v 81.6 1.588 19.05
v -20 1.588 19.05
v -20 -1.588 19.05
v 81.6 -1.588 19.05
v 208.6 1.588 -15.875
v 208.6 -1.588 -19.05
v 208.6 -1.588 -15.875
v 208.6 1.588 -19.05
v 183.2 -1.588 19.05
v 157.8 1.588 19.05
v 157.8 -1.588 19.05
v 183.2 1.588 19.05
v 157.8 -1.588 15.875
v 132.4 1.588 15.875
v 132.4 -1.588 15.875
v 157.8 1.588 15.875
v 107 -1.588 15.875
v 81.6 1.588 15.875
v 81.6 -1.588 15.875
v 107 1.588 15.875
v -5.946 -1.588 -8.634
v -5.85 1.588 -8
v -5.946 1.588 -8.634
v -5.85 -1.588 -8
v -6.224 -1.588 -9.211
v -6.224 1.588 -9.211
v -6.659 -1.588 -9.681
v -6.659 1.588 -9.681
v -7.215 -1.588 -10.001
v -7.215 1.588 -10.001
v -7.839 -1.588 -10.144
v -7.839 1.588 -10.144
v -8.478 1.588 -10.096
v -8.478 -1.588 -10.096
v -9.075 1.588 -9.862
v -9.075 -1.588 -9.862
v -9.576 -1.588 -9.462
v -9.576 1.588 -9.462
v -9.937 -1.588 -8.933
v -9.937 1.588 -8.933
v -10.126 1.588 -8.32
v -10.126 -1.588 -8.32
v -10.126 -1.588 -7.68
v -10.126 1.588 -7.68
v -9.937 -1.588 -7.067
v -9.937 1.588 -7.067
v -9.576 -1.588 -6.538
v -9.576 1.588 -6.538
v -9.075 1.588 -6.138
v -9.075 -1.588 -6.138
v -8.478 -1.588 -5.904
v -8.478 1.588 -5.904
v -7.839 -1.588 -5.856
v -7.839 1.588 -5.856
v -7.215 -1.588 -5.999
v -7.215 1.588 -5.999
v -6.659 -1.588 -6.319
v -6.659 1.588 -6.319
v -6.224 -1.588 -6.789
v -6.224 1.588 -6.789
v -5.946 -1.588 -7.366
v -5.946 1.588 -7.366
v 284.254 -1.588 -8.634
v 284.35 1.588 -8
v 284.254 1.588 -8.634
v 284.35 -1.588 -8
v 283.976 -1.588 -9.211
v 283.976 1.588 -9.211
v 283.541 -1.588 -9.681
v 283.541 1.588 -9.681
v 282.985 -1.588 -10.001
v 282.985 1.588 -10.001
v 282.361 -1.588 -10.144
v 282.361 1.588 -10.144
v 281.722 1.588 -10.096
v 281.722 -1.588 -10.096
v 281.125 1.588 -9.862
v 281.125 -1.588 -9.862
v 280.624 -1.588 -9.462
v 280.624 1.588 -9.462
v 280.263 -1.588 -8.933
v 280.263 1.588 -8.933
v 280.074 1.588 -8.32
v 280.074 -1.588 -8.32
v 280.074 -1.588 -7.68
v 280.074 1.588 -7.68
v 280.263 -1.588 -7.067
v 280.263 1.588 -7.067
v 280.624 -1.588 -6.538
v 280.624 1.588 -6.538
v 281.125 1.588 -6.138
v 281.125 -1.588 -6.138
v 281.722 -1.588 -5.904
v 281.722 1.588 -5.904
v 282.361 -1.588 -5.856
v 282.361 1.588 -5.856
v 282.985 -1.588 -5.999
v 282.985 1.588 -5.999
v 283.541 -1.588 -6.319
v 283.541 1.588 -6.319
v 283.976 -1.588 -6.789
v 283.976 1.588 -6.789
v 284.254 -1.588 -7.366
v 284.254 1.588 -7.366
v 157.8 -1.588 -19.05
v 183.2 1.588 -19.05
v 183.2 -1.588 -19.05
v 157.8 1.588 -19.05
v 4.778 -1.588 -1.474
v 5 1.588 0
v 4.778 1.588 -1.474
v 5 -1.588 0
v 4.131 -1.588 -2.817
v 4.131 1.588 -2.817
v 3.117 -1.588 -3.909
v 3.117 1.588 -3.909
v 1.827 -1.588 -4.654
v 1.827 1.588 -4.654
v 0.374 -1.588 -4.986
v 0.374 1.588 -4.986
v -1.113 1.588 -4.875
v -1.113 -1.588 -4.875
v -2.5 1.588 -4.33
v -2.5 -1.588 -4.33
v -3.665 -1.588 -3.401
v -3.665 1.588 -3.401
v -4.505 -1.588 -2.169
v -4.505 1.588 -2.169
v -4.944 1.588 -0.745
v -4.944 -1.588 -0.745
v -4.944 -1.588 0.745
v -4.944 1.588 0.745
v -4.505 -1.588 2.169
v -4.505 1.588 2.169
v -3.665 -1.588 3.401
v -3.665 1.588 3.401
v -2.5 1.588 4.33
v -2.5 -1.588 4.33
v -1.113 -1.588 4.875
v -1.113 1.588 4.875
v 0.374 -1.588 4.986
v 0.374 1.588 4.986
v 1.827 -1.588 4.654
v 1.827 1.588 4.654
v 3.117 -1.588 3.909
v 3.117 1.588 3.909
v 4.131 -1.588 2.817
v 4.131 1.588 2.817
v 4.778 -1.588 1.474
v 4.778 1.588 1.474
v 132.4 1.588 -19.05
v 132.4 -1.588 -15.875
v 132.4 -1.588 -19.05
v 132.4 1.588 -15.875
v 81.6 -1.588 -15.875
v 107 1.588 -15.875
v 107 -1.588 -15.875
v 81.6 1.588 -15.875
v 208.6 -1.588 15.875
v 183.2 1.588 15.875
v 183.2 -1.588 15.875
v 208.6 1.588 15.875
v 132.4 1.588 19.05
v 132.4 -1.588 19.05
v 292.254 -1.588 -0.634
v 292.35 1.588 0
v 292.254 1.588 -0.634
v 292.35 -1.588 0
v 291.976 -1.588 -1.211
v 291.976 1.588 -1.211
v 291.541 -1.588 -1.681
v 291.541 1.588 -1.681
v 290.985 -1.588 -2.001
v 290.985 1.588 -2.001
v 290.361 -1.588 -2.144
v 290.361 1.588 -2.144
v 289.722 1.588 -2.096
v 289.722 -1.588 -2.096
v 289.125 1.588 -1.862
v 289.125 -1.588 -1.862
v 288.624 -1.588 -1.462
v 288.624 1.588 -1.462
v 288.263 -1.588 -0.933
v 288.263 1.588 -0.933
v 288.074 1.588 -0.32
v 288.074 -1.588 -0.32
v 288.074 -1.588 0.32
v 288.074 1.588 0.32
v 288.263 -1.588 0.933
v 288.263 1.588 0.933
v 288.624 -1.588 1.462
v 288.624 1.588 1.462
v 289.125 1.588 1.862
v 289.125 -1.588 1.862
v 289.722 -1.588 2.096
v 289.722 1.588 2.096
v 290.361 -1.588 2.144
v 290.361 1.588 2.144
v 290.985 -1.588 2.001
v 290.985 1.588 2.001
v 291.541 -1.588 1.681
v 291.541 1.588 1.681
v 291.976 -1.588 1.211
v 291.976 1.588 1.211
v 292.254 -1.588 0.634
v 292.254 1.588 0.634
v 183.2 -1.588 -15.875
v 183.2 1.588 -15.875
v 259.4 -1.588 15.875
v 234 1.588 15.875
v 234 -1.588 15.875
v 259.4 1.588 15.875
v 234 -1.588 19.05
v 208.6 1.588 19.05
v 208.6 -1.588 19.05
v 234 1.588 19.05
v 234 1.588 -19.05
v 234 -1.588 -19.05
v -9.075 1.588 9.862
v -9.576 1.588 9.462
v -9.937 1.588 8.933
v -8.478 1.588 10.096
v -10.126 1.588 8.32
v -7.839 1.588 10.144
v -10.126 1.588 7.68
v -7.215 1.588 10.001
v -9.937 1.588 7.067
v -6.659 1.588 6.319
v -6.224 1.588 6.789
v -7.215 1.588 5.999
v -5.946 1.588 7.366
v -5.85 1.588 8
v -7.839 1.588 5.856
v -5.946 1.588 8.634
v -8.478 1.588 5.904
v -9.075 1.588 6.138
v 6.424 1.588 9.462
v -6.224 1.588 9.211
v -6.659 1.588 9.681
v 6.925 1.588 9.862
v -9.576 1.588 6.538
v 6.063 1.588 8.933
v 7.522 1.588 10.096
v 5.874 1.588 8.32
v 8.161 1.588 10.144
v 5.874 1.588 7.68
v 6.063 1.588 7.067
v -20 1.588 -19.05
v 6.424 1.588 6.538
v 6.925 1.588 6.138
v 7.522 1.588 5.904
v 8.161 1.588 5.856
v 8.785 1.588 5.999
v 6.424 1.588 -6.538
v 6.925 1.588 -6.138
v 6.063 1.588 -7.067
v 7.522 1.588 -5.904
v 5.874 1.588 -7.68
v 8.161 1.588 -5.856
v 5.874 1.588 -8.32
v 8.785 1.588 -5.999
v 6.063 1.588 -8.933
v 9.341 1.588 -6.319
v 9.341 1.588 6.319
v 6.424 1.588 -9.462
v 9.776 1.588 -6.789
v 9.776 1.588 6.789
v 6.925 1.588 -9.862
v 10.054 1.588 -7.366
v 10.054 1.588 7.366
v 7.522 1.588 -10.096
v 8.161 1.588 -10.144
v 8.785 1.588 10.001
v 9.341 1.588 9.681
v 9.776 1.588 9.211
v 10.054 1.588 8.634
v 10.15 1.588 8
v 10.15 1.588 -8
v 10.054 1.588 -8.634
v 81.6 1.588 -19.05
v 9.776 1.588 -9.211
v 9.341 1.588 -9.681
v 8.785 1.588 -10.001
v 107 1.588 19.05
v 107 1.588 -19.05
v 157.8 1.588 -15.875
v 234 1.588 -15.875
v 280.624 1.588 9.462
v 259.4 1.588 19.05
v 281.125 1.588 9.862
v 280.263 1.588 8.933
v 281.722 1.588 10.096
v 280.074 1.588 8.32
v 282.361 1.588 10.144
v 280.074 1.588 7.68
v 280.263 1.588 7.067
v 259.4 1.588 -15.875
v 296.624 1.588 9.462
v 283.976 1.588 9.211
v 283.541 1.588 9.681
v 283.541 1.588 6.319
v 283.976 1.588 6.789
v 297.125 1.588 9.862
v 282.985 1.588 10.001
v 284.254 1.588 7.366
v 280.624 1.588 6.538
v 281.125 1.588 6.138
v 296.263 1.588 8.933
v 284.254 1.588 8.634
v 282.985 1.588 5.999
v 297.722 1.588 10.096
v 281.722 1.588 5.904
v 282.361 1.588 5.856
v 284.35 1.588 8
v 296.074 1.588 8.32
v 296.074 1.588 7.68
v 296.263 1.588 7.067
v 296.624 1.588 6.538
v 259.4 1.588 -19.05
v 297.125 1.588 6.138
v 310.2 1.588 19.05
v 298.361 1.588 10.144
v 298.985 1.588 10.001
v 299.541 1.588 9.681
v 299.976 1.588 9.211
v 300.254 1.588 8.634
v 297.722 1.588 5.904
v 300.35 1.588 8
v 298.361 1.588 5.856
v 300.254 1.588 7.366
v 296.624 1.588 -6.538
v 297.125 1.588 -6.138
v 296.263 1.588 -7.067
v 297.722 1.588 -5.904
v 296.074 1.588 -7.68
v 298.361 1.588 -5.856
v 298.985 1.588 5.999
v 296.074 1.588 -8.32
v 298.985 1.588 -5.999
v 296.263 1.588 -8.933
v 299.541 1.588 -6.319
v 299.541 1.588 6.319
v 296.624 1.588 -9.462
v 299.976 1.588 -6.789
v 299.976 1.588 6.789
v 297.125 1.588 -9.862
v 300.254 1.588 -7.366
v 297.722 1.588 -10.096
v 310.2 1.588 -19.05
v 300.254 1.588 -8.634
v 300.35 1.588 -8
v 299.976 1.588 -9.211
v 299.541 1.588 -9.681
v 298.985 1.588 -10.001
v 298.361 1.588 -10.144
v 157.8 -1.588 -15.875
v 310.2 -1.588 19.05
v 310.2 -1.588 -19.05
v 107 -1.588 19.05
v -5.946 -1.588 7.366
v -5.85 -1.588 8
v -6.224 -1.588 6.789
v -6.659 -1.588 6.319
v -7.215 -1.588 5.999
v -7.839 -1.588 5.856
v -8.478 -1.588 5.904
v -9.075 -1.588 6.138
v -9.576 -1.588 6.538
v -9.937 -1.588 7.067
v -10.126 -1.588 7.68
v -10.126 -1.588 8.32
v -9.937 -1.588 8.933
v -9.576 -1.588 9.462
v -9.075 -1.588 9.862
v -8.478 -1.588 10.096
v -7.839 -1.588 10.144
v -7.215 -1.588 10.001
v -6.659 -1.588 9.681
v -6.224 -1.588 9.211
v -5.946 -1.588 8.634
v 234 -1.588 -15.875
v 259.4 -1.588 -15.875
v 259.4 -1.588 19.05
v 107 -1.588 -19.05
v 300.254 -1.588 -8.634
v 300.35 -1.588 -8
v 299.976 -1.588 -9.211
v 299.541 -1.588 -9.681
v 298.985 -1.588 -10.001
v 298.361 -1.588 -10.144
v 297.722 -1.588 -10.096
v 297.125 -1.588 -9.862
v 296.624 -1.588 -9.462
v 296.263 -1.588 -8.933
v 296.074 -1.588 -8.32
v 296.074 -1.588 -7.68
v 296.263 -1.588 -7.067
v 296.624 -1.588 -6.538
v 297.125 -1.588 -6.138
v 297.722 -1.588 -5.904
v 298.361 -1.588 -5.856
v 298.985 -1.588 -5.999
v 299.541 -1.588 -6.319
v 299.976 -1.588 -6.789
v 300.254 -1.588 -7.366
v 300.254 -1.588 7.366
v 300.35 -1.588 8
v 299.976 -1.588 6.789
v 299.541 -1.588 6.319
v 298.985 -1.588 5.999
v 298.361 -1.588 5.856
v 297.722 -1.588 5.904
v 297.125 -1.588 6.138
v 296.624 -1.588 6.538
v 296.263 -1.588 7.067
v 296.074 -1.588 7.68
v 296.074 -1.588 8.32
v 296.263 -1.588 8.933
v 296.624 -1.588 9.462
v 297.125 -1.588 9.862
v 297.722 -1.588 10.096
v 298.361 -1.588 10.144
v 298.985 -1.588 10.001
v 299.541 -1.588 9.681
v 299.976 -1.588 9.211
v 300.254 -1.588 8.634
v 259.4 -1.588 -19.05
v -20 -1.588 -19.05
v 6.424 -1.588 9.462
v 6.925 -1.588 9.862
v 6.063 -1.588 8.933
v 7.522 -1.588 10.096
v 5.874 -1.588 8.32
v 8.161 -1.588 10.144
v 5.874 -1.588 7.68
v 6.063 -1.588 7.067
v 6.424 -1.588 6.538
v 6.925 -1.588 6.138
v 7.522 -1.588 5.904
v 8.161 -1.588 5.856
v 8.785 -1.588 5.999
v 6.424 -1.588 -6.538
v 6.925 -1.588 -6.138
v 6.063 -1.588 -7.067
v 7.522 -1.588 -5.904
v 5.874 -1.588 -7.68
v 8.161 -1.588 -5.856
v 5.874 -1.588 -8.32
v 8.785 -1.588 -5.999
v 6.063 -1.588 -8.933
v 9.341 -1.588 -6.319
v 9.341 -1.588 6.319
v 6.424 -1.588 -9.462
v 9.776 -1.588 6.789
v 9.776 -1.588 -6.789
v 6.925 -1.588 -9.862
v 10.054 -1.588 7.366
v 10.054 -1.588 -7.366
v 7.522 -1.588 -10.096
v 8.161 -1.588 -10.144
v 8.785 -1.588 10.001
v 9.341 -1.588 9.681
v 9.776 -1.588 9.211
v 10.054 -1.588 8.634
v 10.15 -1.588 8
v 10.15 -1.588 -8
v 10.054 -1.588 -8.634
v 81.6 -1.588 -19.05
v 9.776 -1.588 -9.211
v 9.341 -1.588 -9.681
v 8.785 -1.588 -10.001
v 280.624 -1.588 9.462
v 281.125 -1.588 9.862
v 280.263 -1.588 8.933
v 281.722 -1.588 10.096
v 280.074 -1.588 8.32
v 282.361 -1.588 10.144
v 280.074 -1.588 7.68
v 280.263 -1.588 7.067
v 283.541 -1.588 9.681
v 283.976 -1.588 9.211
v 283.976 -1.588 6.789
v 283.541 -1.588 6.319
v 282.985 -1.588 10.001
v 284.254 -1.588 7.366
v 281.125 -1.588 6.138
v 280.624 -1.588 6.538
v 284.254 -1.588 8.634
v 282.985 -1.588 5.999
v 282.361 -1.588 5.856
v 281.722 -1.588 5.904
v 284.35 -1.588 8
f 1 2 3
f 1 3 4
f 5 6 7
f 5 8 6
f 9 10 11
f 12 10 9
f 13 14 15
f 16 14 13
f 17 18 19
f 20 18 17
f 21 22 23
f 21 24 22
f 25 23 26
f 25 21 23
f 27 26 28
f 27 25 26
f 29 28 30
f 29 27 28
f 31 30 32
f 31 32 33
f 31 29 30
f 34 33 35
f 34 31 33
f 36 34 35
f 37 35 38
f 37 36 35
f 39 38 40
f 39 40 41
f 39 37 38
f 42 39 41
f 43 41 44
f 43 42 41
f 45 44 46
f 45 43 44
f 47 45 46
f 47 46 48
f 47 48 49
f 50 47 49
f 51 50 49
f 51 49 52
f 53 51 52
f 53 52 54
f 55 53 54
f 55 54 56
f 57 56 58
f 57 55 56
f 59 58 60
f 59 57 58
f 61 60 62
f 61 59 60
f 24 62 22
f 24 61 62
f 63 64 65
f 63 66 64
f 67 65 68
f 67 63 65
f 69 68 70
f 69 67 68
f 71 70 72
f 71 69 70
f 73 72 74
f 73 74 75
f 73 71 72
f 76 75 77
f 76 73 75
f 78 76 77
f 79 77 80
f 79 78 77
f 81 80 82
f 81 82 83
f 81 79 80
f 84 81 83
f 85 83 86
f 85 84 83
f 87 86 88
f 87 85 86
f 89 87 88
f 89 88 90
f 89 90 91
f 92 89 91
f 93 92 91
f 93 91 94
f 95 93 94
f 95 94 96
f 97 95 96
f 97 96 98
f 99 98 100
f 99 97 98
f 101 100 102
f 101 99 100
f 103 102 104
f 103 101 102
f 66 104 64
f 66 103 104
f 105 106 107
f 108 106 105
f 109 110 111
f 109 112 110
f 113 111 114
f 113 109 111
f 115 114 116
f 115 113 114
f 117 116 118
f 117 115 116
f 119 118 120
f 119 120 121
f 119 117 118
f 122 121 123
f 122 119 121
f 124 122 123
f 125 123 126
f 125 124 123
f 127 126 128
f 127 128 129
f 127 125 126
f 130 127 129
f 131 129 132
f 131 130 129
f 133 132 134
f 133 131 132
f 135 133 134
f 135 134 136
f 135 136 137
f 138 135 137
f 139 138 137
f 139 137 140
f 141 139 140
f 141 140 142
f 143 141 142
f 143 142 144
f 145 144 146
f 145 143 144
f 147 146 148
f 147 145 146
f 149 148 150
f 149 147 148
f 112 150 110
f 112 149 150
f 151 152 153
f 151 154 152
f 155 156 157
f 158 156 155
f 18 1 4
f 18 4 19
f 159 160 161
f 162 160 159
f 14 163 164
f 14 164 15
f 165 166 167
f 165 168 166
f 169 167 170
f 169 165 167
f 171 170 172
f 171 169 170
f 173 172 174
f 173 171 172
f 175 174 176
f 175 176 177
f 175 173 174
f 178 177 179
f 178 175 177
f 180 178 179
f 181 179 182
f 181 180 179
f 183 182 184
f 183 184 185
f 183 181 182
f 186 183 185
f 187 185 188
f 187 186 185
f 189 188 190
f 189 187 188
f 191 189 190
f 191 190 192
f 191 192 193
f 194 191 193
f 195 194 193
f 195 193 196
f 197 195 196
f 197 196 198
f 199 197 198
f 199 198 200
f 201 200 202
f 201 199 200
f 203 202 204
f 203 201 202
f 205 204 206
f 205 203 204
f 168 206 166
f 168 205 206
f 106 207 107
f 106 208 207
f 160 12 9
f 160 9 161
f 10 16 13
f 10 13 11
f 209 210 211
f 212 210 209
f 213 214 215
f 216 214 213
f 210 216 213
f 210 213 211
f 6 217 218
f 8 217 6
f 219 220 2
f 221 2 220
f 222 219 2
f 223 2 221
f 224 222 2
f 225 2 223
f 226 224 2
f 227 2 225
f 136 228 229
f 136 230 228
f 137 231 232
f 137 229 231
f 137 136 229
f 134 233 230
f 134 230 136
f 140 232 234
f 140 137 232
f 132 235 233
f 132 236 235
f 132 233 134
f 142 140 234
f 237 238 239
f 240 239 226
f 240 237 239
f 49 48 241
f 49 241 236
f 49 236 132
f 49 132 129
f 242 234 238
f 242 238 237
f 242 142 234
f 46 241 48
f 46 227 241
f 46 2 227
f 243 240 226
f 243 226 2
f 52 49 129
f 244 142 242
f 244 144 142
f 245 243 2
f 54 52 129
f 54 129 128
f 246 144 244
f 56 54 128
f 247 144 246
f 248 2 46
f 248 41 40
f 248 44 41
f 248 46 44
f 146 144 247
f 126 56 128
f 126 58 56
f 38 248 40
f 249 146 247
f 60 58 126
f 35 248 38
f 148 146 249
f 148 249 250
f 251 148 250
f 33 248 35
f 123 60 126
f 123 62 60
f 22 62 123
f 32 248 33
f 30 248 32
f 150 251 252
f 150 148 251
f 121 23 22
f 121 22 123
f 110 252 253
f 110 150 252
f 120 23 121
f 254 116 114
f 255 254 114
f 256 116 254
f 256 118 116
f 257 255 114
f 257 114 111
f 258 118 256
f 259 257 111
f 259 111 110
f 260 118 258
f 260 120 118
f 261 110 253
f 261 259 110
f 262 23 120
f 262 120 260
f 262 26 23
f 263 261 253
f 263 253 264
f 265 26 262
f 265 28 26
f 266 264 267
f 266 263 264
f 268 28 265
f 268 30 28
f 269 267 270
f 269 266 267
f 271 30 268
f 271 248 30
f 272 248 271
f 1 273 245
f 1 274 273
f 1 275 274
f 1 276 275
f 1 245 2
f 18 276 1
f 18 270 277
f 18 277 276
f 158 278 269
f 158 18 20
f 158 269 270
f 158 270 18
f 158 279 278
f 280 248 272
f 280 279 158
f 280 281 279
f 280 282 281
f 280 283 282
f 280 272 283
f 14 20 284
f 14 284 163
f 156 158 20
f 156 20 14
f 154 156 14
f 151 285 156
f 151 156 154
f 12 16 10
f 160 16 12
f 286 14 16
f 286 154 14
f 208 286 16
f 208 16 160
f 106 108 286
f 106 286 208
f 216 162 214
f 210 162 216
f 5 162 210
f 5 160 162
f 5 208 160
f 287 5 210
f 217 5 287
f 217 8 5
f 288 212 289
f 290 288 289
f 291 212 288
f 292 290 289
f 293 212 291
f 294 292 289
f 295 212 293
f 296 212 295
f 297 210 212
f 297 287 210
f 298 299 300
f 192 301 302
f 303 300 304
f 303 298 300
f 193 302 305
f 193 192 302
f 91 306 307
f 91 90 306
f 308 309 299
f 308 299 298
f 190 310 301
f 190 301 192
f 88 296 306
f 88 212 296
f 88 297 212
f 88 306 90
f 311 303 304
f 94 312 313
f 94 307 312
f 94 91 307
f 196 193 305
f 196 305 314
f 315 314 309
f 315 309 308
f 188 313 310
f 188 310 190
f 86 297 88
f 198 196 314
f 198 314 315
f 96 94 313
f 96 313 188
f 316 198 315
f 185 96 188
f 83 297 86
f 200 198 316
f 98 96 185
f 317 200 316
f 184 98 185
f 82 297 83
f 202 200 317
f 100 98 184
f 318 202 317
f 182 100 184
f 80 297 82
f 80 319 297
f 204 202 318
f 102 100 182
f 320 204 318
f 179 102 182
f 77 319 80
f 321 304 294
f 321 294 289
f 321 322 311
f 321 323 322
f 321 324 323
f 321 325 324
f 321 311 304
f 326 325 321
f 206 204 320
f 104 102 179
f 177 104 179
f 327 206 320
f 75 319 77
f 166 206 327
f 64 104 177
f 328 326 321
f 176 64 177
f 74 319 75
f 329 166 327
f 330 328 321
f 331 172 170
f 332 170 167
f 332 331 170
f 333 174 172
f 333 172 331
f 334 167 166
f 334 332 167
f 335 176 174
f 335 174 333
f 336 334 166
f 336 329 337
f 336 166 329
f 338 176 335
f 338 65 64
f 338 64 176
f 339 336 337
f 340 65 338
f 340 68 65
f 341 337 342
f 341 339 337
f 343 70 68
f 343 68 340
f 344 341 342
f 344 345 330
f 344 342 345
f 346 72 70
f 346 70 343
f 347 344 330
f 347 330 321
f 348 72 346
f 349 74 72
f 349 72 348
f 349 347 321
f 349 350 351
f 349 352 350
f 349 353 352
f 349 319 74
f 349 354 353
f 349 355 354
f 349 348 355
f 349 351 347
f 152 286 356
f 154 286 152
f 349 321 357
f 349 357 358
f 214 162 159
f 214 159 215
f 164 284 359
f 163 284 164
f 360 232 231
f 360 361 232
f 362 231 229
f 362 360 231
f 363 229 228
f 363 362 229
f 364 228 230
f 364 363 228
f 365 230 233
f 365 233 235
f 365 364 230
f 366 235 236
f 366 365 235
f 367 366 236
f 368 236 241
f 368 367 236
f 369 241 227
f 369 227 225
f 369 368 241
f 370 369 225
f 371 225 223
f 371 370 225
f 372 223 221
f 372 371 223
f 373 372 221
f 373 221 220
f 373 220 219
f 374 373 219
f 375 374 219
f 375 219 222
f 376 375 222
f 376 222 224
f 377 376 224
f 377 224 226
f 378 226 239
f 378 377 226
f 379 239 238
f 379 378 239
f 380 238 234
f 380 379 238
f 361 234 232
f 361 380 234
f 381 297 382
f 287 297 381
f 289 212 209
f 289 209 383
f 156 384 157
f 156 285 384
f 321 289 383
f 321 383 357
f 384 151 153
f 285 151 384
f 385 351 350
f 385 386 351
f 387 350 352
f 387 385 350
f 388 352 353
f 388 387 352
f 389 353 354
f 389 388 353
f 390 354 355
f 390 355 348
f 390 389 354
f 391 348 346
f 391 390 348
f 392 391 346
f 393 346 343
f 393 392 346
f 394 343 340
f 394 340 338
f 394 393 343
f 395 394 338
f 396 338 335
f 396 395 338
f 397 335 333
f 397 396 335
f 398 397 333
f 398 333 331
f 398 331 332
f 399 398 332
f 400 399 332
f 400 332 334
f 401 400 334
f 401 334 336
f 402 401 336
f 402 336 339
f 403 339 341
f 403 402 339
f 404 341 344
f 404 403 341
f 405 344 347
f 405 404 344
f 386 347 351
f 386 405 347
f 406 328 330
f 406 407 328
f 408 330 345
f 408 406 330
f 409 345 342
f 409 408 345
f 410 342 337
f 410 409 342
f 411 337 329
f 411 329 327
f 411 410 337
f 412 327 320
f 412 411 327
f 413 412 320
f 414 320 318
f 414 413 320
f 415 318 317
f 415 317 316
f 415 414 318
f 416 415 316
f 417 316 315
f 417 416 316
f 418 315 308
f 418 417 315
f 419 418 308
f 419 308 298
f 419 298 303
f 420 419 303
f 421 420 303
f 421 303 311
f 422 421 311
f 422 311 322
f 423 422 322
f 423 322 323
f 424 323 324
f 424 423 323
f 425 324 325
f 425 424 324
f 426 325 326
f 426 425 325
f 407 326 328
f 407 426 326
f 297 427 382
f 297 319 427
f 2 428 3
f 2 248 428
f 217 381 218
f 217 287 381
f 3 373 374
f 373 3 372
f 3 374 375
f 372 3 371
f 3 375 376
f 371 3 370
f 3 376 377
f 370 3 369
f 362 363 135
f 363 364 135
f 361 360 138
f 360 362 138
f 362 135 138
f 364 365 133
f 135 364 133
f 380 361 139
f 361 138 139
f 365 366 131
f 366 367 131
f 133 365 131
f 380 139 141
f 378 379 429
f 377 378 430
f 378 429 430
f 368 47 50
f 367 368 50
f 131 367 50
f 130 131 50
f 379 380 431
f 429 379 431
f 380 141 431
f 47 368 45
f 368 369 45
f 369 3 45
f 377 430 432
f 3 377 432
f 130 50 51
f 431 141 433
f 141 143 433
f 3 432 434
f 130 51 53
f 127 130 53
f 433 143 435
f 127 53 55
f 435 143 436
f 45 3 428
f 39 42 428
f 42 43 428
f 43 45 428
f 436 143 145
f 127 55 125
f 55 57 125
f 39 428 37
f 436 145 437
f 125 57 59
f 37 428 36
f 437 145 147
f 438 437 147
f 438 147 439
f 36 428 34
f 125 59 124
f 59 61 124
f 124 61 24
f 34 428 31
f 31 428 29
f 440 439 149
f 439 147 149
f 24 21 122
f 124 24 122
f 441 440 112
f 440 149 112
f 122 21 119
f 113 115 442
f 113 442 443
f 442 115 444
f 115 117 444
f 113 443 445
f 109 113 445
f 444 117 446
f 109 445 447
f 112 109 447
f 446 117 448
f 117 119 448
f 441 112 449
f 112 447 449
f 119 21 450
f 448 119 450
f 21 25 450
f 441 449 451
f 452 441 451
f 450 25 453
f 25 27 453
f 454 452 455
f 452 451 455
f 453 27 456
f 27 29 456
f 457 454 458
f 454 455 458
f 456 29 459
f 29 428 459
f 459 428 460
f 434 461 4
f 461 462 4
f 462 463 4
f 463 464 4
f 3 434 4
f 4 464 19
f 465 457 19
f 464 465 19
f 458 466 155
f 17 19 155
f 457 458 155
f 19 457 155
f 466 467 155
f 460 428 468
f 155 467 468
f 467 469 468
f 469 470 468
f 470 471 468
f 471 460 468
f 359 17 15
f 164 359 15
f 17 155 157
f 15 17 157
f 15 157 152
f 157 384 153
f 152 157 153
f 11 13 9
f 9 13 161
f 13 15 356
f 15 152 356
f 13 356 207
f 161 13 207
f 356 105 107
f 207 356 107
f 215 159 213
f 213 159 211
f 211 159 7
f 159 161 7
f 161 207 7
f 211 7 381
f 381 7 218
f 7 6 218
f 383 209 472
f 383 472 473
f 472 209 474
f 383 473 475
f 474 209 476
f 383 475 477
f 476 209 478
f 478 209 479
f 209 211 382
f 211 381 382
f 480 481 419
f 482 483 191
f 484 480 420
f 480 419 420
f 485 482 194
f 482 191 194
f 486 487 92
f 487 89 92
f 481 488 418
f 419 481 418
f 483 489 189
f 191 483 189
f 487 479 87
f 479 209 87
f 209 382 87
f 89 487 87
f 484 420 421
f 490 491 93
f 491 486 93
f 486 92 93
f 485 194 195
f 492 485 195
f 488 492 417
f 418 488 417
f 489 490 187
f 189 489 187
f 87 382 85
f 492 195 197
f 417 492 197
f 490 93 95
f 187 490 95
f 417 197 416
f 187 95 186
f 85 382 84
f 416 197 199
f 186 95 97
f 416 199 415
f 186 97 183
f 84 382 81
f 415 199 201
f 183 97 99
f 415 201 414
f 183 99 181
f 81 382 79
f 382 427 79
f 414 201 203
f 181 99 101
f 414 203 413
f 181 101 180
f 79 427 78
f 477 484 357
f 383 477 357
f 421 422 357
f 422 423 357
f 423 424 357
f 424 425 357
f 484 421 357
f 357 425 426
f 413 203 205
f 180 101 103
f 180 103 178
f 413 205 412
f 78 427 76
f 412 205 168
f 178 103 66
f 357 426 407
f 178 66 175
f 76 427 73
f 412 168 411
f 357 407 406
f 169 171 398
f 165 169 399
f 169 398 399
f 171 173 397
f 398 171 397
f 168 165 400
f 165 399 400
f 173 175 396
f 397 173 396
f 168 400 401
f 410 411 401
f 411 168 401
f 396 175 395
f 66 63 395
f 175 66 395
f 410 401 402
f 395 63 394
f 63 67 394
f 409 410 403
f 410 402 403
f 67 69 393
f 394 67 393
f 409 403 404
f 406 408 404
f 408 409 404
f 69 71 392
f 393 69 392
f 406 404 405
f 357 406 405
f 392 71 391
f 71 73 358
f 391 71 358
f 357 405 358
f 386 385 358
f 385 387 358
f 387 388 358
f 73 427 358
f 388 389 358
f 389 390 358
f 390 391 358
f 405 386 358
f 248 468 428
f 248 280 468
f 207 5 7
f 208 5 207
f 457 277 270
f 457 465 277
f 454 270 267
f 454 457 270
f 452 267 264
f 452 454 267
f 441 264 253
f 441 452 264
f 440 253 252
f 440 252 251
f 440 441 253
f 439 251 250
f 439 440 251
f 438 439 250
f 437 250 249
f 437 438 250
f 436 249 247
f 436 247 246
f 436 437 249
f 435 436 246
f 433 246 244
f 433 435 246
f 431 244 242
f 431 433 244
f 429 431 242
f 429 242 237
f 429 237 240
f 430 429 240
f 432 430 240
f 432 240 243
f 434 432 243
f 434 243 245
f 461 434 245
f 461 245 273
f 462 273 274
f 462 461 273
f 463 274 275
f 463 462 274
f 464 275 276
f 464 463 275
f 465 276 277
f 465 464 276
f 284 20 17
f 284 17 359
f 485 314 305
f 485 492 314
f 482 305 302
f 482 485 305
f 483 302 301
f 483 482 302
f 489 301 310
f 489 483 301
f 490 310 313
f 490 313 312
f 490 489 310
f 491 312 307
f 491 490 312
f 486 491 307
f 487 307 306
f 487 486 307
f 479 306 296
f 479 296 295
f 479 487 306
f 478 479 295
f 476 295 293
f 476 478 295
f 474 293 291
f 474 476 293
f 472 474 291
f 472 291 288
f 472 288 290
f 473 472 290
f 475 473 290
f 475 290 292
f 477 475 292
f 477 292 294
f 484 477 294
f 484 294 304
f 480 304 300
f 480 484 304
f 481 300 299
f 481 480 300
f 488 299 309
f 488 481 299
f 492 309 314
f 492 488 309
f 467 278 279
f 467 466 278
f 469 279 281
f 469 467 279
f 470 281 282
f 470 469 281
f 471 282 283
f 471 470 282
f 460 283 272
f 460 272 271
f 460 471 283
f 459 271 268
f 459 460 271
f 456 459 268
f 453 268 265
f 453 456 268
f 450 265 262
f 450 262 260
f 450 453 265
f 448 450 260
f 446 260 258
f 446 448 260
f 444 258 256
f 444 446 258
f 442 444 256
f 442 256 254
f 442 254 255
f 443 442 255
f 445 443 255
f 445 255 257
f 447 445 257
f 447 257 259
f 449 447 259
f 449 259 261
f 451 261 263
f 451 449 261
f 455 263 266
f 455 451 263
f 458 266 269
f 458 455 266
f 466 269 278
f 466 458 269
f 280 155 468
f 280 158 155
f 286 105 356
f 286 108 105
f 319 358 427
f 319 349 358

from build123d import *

# Parameters (mm, degrees)
SKETCH1_R           = 2.15
SKETCH1_R_2         = 5
BOSS_EXTRUDE1_DEPTH = 1.5875


with BuildPart() as part:
    # Sketch1 → Boss-Extrude1 (new body, symmetric)
    with BuildSketch(Plane(origin=(0, 0, 0), x_dir=(1, 0, 0), z_dir=(0, 1, 0))):
        Polygon((-20, 19.05), (-20, -19.05), (81.6, -19.05), (81.6, -15.875), (107, -15.875), (107, -19.05), (132.4, -19.05), (132.4, -15.875), (157.8, -15.875), (157.8, -19.05), (183.2, -19.05), (183.2, -15.875), (208.6, -15.875), (208.6, -19.05), (234, -19.05), (234, -15.875), (259.4, -15.875), (259.4, -19.05), (310.2, -19.05), (310.2, 19.05), (259.4, 19.05), (259.4, 15.875), (234, 15.875), (234, 19.05), (208.6, 19.05), (208.6, 15.875), (183.2, 15.875), (183.2, 19.05), (157.8, 19.05), (157.8, 15.875), (132.4, 15.875), (132.4, 19.05), (107, 19.05), (107, 15.875), (81.6, 15.875), (81.6, 19.05), align=None)
        with Locations((-8, -8)):
            Circle(SKETCH1_R, mode=Mode.SUBTRACT)
        with Locations((8, -8)):
            Circle(SKETCH1_R, mode=Mode.SUBTRACT)
        with Locations((282.2, -8)):
            Circle(SKETCH1_R, mode=Mode.SUBTRACT)
        with Locations((298.2, -8)):
            Circle(SKETCH1_R, mode=Mode.SUBTRACT)
        Circle(SKETCH1_R_2, mode=Mode.SUBTRACT)
        with Locations((-8, 8)):
            Circle(SKETCH1_R, mode=Mode.SUBTRACT)
        with Locations((8, 8)):
            Circle(SKETCH1_R, mode=Mode.SUBTRACT)
        with Locations((290.2, 0)):
            Circle(SKETCH1_R, mode=Mode.SUBTRACT)
        with Locations((282.2, 8)):
            Circle(SKETCH1_R, mode=Mode.SUBTRACT)
        with Locations((298.2, 8)):
            Circle(SKETCH1_R, mode=Mode.SUBTRACT)
    extrude(amount=BOSS_EXTRUDE1_DEPTH, both=True)


solid = part.part
